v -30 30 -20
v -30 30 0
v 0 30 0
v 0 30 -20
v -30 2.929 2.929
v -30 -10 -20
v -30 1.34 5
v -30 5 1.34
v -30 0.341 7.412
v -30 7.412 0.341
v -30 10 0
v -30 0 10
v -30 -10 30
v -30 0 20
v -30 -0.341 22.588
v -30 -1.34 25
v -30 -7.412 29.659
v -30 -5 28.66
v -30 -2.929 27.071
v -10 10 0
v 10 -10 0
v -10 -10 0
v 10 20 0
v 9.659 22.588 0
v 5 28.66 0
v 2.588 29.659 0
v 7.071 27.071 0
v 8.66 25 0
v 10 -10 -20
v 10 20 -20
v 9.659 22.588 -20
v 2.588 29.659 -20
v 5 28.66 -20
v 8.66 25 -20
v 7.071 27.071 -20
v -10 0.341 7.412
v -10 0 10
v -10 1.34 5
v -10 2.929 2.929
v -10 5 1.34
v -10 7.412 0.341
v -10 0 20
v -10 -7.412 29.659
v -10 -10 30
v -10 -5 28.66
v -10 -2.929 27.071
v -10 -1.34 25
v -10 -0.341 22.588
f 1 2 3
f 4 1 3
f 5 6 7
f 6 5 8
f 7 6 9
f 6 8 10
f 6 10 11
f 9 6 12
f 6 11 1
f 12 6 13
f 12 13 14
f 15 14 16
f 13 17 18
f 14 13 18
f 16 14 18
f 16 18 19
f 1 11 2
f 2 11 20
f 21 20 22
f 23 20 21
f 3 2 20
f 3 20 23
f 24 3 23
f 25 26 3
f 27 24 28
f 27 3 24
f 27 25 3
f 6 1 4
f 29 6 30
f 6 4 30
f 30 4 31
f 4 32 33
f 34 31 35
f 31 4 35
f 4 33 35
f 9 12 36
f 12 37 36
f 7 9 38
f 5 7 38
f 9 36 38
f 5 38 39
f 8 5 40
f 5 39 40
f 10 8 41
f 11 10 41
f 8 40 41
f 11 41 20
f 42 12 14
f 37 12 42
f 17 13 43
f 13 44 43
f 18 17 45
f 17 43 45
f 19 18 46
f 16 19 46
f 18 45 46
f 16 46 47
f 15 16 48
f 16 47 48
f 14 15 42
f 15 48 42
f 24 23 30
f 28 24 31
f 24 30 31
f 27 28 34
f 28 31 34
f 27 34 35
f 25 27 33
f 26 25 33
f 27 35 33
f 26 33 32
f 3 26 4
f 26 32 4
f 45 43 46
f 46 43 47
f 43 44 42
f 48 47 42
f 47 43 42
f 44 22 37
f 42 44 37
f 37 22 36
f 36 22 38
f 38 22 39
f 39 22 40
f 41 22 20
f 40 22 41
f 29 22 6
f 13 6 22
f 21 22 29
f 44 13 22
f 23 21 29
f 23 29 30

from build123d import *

# Parameters (mm, degrees)
SKETCH1_W           = 20
SKETCH1_H           = 10
BOSS_EXTRUDE1_DEPTH = 30
SKETCH2_W           = 40
SKETCH2_H           = 40
BOSS_EXTRUDE2_DEPTH = 20
FILLET1_R           = 10


with BuildPart() as part:
    # Sketch1 → Boss-Extrude1 (new body)
    with BuildSketch(Plane.XY):
        with Locations((-20, -5)):
            Rectangle(SKETCH1_W, SKETCH1_H)
    extrude(amount=BOSS_EXTRUDE1_DEPTH)

    # Sketch2 → Boss-Extrude2 (add)
    with BuildSketch(Plane.XY):
        with Locations((-10, 10)):
            Rectangle(SKETCH2_W, SKETCH2_H)
    extrude(amount=-BOSS_EXTRUDE2_DEPTH)

    # Fillet1
    fillet1_edges = [part.edges().sort_by_distance(p)[0] for p in [
        (-20, 0, 0),
        (10, 30, -10),
        (-20, 0, 30),
    ]]
    fillet(fillet1_edges, radius=FILLET1_R - 0.0001)  # a hair under: the kernel refuses the full size


solid = part.part
